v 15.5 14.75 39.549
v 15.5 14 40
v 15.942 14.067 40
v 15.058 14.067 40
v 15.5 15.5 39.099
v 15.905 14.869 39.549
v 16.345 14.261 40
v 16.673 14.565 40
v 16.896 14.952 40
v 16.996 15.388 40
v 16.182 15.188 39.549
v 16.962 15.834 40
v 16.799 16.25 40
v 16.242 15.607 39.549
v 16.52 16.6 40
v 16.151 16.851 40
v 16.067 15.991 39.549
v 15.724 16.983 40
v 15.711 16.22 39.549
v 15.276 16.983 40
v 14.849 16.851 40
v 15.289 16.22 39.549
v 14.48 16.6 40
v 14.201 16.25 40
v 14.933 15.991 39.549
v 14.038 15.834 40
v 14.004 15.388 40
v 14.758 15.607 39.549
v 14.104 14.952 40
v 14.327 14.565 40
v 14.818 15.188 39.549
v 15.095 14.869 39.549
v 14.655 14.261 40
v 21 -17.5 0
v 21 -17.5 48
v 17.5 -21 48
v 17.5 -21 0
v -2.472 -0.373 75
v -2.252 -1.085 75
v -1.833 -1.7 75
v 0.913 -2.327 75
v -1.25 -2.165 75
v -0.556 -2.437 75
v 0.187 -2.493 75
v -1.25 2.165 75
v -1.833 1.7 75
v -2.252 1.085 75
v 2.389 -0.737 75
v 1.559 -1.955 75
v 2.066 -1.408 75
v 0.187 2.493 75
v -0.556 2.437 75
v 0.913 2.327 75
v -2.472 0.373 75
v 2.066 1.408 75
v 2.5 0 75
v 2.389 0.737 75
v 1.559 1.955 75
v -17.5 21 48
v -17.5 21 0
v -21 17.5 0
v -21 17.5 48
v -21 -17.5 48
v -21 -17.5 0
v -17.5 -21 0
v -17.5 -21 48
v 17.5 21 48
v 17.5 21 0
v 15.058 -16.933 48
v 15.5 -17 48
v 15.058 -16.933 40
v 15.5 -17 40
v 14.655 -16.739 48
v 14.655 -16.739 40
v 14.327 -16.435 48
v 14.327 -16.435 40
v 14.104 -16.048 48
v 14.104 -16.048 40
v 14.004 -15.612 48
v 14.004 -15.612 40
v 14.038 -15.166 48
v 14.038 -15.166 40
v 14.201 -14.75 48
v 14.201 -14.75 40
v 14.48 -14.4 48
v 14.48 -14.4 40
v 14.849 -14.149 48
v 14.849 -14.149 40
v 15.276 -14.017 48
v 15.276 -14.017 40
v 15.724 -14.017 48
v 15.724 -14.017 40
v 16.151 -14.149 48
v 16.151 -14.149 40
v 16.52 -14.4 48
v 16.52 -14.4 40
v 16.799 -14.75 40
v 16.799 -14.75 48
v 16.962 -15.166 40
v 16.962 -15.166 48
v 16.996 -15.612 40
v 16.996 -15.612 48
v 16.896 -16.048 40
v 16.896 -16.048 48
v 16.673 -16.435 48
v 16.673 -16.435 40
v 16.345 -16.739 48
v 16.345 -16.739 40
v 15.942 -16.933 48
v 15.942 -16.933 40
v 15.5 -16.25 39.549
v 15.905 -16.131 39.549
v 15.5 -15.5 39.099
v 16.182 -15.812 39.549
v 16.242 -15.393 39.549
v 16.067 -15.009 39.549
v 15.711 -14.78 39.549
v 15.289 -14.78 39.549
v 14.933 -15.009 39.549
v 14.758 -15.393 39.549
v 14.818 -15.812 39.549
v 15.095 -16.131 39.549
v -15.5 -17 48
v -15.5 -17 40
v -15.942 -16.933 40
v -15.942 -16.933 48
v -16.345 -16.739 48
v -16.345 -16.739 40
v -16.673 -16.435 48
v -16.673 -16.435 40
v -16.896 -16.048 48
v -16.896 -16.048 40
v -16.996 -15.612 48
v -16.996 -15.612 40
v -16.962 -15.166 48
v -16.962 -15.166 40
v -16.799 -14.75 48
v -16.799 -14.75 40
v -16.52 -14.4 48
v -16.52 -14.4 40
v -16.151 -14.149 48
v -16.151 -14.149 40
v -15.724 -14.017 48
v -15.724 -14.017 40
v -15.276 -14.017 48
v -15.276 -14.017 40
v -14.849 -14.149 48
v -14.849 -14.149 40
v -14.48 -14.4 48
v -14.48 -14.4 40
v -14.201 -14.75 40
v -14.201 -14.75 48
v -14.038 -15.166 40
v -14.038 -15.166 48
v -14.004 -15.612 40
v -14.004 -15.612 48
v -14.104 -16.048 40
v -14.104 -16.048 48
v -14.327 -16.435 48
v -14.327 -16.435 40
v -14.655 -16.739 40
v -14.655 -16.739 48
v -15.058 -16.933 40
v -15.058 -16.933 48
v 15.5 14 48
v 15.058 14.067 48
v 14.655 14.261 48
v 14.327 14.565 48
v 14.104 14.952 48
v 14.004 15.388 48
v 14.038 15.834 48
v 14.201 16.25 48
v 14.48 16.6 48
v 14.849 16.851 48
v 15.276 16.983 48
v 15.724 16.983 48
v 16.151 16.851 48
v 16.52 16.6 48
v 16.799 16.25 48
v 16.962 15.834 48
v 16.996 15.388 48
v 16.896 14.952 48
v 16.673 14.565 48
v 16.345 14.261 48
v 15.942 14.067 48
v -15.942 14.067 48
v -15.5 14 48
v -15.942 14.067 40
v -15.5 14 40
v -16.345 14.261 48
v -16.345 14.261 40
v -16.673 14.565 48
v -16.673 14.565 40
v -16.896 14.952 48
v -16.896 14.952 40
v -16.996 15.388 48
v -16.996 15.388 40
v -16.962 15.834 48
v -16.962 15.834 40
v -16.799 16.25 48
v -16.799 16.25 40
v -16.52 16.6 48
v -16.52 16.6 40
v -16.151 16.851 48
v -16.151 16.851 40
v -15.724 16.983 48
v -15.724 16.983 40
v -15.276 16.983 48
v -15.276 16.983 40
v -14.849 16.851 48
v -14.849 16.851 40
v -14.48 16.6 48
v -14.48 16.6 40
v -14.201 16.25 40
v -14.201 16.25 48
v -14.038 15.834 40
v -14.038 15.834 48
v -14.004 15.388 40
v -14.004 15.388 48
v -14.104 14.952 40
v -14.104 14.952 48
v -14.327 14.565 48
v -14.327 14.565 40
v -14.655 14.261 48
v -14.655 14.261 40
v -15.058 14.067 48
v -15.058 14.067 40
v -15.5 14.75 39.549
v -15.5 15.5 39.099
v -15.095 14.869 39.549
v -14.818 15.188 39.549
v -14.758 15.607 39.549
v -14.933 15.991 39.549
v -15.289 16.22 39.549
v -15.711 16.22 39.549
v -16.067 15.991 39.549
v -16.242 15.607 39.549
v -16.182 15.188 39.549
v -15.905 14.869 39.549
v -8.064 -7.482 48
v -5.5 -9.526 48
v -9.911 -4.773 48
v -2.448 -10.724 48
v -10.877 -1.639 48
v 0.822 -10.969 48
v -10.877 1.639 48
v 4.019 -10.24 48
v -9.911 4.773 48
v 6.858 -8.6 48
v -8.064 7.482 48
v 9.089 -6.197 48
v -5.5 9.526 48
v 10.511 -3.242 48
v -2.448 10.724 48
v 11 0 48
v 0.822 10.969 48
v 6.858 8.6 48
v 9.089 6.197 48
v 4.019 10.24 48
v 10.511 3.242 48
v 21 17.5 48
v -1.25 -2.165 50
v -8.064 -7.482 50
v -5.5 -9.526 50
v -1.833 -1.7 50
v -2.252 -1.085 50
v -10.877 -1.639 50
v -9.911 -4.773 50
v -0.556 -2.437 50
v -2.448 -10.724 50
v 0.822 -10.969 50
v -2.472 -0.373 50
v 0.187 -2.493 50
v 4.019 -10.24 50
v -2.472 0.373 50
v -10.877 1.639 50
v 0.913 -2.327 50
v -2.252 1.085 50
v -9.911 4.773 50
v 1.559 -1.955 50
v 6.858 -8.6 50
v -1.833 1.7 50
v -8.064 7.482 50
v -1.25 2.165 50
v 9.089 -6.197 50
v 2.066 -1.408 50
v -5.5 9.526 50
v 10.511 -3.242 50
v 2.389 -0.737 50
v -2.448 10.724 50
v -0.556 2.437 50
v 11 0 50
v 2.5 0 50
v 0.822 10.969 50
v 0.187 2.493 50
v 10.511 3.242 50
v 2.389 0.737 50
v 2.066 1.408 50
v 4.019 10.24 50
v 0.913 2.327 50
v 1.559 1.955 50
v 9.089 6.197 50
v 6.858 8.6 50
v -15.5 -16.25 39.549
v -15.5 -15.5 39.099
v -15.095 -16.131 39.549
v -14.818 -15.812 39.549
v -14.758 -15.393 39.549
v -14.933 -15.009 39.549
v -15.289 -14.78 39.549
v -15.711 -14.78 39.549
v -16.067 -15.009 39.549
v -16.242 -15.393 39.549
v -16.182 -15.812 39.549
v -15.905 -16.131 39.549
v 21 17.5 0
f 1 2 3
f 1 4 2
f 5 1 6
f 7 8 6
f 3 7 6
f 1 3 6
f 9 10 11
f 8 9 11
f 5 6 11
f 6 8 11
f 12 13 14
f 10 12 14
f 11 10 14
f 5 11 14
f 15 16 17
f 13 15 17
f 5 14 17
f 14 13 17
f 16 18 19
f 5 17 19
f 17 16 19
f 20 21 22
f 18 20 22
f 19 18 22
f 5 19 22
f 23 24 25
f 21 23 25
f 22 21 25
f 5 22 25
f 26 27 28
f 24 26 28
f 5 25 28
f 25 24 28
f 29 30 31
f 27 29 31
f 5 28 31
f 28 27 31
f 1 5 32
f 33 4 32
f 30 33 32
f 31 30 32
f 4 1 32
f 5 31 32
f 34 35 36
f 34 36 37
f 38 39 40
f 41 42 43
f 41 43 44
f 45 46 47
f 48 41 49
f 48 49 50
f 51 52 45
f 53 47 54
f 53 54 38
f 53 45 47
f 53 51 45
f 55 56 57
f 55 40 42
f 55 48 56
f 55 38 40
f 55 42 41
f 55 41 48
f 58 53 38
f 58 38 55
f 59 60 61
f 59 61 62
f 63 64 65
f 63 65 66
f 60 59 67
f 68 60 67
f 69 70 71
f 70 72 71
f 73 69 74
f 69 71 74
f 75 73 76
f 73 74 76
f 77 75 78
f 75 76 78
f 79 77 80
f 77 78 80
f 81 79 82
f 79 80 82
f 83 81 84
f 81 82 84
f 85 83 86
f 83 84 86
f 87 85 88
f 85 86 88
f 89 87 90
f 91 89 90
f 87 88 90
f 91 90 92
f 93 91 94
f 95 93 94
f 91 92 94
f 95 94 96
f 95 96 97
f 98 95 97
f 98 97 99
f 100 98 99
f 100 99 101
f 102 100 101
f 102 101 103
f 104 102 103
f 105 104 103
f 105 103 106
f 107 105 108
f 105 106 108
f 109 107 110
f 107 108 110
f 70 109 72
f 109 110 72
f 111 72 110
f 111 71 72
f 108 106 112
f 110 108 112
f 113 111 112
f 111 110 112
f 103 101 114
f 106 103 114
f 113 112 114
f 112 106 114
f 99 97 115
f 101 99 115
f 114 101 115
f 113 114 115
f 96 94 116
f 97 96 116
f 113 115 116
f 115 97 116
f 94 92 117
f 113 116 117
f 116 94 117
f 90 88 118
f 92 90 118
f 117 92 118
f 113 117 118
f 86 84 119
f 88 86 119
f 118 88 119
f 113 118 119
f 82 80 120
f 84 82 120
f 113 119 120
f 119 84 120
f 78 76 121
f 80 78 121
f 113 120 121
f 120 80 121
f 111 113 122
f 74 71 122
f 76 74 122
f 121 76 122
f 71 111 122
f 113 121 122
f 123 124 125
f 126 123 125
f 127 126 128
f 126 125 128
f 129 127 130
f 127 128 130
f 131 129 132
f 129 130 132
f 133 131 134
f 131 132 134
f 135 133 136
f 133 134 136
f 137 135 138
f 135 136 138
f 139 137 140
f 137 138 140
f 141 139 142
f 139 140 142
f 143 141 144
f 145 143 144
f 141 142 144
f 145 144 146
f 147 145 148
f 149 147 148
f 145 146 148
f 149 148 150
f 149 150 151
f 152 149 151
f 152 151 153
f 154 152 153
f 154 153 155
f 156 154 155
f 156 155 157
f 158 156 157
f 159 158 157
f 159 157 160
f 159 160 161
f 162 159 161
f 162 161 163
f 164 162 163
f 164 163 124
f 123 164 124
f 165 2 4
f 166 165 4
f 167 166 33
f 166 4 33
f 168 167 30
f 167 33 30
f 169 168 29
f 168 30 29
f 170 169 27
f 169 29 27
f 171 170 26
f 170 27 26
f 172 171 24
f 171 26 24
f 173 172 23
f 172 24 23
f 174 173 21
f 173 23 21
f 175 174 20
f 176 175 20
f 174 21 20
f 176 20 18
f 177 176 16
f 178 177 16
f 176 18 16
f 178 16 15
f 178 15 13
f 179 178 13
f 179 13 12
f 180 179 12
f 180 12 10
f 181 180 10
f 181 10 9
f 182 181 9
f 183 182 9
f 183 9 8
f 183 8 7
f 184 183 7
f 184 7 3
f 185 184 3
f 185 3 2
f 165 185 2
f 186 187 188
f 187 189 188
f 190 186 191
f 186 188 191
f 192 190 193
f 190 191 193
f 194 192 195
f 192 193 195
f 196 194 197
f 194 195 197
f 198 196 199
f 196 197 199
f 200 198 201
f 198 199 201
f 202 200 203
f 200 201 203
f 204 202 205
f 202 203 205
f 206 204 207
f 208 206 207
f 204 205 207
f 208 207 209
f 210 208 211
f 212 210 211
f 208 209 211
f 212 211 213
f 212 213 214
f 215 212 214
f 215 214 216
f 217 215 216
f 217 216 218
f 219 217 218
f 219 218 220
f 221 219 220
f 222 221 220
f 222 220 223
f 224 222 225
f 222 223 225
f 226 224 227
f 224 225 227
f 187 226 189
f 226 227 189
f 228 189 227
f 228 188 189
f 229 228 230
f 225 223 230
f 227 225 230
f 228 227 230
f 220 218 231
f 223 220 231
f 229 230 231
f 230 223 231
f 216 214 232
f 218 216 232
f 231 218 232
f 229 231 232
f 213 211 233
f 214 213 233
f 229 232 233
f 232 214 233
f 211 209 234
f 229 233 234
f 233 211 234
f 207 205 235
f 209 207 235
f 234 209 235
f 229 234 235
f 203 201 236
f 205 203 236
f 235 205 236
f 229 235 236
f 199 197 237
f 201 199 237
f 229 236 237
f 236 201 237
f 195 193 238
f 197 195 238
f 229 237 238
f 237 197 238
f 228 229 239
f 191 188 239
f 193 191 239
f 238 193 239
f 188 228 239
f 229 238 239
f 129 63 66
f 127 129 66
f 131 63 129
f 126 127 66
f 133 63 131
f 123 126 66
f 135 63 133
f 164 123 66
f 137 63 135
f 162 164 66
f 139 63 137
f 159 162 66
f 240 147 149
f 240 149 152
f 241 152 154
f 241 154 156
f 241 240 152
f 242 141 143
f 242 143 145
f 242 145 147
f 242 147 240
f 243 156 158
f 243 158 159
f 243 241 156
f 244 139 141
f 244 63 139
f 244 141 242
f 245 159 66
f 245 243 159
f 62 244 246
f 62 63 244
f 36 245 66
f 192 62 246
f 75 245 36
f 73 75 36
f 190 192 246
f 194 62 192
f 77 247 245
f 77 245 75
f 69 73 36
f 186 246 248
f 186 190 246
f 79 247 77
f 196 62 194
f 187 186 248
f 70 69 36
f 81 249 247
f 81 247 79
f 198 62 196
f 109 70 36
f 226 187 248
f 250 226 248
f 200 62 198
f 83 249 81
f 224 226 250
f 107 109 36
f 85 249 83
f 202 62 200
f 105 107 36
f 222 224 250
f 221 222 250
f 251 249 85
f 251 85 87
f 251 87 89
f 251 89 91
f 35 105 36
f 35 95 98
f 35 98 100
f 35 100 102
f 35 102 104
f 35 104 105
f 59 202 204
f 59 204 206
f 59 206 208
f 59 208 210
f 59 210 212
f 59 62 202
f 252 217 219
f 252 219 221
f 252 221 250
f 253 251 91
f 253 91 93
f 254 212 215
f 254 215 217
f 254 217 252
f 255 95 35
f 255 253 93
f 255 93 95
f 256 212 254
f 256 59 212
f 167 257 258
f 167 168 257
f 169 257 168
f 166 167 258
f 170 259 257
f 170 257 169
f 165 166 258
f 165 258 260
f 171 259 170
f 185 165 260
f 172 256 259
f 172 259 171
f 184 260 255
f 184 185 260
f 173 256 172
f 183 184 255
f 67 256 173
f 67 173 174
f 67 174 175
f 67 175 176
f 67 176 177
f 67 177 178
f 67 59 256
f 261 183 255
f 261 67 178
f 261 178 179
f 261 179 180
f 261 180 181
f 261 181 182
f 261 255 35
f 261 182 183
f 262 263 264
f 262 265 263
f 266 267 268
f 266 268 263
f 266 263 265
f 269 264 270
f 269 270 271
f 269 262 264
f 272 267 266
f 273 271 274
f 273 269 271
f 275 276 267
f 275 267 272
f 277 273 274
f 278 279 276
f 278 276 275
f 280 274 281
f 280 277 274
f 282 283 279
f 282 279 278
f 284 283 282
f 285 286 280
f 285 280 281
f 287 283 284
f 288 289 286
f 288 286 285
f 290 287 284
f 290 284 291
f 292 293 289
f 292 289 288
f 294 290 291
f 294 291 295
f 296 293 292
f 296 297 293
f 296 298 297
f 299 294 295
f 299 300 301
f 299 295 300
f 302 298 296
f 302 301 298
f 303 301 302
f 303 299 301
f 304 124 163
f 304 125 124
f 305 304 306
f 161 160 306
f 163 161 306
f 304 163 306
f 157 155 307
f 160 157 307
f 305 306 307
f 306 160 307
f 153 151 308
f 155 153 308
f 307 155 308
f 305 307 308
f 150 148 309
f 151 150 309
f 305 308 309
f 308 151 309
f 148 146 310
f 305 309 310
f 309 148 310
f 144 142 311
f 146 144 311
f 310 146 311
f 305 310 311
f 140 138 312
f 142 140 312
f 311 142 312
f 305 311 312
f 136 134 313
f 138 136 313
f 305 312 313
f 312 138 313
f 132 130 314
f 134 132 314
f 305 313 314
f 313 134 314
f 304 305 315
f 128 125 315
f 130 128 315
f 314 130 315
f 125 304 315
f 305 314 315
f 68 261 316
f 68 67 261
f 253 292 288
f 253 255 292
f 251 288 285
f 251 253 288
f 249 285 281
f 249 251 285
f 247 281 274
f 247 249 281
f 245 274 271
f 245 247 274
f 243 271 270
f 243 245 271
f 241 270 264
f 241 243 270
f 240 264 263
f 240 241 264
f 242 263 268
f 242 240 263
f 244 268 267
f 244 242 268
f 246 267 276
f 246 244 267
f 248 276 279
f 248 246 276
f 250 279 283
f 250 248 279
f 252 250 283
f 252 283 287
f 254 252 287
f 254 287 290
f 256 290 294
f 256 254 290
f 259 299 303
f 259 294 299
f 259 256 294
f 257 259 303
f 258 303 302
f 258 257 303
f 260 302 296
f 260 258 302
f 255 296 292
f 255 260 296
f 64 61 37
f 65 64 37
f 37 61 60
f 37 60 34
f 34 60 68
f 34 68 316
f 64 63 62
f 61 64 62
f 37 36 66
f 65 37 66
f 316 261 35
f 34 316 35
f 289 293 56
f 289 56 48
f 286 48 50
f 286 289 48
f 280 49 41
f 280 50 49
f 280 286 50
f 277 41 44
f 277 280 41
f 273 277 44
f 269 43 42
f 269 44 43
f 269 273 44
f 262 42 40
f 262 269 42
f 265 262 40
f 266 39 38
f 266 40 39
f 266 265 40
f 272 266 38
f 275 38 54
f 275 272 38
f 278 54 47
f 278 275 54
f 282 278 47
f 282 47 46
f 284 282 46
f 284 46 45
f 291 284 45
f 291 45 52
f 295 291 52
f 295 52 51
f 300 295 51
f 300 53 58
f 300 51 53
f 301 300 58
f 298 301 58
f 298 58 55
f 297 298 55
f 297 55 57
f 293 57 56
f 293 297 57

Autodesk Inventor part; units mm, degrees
ref_plane "YZ Plane" through (0, 0, 0) normal (1, 0, 0) x (0, 1, 0)
ref_plane "XZ Plane" through (0, 0, 0) normal (0, 1, 0) x (-1, 0, 0)
ref_plane "XY Plane" through (0, 0, 0) normal (0, 0, 1) x (1, 0, 0)
sketch "Sketch1" plane through (0, 0, 0) normal (0, 0, 1) x (1, 0, 0)
  line L0 (21, -21) -> (-21, -21)
  line L1 (-21, -21) -> (-21, 21)
  line L2 (-21, 21) -> (21, 21)
  line L3 (21, 21) -> (21, -21)
  line L4 (21, -21) -> (-21, 21) construction
  line L5 (-21, -21) -> (21, 21) construction
  point P0 (0, 0)
  dimension "d0" = 42
extrude "Extrusion1" add sketch "Sketch1" along normal blind 48
sketch "Sketch2" plane through (0, 0, 48) normal (0, 0, 1) x (1, 0, 0)
  point P0 (0, 0)
  point P1 (-15.5, 15.5)
  point P2 (-15.5, -15.5)
  point P3 (15.5, -15.5)
  point P4 (15.5, 15.5)
  dimension "d3" = 31
  dimension "d4" = 31
  dimension "d5" = 15.5
  dimension "d6" = 15.5
hole "Hole1" at (-15.5, 15.5, 48) at (-15.5, -15.5, 48) at (15.5, -15.5, 48) at (15.5, 15.5, 48) direction (0, 0, -1) diameter 3 depth 8 tip angle 118
chamfer "Chamfer1" distance 3.5 angle 45 4 edges at (21, 21, 24) (21, -21, 24) (-21, 21, 24) (-21, -21, 24)
sketch "Sketch3" plane through (0, 0, 48) normal (0, 0, 1) x (1, 0, 0)
  circle A0 centre (0, 0) radius 11
  dimension "d17" = 22
extrude "Extrusion2" add sketch "Sketch3" along normal blind 2
sketch "Sketch4" plane through (0, 0, 50) normal (0, 0, 1) x (1, 0, 0)
  circle A0 centre (0, 0) radius 11 projected
  circle A1 centre (0, 0) radius 2.5
  dimension "d20" = 5
extrude "Extrusion3" add sketch "Sketch4" along normal blind 25 contours A1
equation "\"d4\" = d3"
equation "\"d5\" = 0.5 * d3"
equation "\"d6\" = 0.5 * d3"
properties part number "Motor_XY" material "Steel, Alloy"
